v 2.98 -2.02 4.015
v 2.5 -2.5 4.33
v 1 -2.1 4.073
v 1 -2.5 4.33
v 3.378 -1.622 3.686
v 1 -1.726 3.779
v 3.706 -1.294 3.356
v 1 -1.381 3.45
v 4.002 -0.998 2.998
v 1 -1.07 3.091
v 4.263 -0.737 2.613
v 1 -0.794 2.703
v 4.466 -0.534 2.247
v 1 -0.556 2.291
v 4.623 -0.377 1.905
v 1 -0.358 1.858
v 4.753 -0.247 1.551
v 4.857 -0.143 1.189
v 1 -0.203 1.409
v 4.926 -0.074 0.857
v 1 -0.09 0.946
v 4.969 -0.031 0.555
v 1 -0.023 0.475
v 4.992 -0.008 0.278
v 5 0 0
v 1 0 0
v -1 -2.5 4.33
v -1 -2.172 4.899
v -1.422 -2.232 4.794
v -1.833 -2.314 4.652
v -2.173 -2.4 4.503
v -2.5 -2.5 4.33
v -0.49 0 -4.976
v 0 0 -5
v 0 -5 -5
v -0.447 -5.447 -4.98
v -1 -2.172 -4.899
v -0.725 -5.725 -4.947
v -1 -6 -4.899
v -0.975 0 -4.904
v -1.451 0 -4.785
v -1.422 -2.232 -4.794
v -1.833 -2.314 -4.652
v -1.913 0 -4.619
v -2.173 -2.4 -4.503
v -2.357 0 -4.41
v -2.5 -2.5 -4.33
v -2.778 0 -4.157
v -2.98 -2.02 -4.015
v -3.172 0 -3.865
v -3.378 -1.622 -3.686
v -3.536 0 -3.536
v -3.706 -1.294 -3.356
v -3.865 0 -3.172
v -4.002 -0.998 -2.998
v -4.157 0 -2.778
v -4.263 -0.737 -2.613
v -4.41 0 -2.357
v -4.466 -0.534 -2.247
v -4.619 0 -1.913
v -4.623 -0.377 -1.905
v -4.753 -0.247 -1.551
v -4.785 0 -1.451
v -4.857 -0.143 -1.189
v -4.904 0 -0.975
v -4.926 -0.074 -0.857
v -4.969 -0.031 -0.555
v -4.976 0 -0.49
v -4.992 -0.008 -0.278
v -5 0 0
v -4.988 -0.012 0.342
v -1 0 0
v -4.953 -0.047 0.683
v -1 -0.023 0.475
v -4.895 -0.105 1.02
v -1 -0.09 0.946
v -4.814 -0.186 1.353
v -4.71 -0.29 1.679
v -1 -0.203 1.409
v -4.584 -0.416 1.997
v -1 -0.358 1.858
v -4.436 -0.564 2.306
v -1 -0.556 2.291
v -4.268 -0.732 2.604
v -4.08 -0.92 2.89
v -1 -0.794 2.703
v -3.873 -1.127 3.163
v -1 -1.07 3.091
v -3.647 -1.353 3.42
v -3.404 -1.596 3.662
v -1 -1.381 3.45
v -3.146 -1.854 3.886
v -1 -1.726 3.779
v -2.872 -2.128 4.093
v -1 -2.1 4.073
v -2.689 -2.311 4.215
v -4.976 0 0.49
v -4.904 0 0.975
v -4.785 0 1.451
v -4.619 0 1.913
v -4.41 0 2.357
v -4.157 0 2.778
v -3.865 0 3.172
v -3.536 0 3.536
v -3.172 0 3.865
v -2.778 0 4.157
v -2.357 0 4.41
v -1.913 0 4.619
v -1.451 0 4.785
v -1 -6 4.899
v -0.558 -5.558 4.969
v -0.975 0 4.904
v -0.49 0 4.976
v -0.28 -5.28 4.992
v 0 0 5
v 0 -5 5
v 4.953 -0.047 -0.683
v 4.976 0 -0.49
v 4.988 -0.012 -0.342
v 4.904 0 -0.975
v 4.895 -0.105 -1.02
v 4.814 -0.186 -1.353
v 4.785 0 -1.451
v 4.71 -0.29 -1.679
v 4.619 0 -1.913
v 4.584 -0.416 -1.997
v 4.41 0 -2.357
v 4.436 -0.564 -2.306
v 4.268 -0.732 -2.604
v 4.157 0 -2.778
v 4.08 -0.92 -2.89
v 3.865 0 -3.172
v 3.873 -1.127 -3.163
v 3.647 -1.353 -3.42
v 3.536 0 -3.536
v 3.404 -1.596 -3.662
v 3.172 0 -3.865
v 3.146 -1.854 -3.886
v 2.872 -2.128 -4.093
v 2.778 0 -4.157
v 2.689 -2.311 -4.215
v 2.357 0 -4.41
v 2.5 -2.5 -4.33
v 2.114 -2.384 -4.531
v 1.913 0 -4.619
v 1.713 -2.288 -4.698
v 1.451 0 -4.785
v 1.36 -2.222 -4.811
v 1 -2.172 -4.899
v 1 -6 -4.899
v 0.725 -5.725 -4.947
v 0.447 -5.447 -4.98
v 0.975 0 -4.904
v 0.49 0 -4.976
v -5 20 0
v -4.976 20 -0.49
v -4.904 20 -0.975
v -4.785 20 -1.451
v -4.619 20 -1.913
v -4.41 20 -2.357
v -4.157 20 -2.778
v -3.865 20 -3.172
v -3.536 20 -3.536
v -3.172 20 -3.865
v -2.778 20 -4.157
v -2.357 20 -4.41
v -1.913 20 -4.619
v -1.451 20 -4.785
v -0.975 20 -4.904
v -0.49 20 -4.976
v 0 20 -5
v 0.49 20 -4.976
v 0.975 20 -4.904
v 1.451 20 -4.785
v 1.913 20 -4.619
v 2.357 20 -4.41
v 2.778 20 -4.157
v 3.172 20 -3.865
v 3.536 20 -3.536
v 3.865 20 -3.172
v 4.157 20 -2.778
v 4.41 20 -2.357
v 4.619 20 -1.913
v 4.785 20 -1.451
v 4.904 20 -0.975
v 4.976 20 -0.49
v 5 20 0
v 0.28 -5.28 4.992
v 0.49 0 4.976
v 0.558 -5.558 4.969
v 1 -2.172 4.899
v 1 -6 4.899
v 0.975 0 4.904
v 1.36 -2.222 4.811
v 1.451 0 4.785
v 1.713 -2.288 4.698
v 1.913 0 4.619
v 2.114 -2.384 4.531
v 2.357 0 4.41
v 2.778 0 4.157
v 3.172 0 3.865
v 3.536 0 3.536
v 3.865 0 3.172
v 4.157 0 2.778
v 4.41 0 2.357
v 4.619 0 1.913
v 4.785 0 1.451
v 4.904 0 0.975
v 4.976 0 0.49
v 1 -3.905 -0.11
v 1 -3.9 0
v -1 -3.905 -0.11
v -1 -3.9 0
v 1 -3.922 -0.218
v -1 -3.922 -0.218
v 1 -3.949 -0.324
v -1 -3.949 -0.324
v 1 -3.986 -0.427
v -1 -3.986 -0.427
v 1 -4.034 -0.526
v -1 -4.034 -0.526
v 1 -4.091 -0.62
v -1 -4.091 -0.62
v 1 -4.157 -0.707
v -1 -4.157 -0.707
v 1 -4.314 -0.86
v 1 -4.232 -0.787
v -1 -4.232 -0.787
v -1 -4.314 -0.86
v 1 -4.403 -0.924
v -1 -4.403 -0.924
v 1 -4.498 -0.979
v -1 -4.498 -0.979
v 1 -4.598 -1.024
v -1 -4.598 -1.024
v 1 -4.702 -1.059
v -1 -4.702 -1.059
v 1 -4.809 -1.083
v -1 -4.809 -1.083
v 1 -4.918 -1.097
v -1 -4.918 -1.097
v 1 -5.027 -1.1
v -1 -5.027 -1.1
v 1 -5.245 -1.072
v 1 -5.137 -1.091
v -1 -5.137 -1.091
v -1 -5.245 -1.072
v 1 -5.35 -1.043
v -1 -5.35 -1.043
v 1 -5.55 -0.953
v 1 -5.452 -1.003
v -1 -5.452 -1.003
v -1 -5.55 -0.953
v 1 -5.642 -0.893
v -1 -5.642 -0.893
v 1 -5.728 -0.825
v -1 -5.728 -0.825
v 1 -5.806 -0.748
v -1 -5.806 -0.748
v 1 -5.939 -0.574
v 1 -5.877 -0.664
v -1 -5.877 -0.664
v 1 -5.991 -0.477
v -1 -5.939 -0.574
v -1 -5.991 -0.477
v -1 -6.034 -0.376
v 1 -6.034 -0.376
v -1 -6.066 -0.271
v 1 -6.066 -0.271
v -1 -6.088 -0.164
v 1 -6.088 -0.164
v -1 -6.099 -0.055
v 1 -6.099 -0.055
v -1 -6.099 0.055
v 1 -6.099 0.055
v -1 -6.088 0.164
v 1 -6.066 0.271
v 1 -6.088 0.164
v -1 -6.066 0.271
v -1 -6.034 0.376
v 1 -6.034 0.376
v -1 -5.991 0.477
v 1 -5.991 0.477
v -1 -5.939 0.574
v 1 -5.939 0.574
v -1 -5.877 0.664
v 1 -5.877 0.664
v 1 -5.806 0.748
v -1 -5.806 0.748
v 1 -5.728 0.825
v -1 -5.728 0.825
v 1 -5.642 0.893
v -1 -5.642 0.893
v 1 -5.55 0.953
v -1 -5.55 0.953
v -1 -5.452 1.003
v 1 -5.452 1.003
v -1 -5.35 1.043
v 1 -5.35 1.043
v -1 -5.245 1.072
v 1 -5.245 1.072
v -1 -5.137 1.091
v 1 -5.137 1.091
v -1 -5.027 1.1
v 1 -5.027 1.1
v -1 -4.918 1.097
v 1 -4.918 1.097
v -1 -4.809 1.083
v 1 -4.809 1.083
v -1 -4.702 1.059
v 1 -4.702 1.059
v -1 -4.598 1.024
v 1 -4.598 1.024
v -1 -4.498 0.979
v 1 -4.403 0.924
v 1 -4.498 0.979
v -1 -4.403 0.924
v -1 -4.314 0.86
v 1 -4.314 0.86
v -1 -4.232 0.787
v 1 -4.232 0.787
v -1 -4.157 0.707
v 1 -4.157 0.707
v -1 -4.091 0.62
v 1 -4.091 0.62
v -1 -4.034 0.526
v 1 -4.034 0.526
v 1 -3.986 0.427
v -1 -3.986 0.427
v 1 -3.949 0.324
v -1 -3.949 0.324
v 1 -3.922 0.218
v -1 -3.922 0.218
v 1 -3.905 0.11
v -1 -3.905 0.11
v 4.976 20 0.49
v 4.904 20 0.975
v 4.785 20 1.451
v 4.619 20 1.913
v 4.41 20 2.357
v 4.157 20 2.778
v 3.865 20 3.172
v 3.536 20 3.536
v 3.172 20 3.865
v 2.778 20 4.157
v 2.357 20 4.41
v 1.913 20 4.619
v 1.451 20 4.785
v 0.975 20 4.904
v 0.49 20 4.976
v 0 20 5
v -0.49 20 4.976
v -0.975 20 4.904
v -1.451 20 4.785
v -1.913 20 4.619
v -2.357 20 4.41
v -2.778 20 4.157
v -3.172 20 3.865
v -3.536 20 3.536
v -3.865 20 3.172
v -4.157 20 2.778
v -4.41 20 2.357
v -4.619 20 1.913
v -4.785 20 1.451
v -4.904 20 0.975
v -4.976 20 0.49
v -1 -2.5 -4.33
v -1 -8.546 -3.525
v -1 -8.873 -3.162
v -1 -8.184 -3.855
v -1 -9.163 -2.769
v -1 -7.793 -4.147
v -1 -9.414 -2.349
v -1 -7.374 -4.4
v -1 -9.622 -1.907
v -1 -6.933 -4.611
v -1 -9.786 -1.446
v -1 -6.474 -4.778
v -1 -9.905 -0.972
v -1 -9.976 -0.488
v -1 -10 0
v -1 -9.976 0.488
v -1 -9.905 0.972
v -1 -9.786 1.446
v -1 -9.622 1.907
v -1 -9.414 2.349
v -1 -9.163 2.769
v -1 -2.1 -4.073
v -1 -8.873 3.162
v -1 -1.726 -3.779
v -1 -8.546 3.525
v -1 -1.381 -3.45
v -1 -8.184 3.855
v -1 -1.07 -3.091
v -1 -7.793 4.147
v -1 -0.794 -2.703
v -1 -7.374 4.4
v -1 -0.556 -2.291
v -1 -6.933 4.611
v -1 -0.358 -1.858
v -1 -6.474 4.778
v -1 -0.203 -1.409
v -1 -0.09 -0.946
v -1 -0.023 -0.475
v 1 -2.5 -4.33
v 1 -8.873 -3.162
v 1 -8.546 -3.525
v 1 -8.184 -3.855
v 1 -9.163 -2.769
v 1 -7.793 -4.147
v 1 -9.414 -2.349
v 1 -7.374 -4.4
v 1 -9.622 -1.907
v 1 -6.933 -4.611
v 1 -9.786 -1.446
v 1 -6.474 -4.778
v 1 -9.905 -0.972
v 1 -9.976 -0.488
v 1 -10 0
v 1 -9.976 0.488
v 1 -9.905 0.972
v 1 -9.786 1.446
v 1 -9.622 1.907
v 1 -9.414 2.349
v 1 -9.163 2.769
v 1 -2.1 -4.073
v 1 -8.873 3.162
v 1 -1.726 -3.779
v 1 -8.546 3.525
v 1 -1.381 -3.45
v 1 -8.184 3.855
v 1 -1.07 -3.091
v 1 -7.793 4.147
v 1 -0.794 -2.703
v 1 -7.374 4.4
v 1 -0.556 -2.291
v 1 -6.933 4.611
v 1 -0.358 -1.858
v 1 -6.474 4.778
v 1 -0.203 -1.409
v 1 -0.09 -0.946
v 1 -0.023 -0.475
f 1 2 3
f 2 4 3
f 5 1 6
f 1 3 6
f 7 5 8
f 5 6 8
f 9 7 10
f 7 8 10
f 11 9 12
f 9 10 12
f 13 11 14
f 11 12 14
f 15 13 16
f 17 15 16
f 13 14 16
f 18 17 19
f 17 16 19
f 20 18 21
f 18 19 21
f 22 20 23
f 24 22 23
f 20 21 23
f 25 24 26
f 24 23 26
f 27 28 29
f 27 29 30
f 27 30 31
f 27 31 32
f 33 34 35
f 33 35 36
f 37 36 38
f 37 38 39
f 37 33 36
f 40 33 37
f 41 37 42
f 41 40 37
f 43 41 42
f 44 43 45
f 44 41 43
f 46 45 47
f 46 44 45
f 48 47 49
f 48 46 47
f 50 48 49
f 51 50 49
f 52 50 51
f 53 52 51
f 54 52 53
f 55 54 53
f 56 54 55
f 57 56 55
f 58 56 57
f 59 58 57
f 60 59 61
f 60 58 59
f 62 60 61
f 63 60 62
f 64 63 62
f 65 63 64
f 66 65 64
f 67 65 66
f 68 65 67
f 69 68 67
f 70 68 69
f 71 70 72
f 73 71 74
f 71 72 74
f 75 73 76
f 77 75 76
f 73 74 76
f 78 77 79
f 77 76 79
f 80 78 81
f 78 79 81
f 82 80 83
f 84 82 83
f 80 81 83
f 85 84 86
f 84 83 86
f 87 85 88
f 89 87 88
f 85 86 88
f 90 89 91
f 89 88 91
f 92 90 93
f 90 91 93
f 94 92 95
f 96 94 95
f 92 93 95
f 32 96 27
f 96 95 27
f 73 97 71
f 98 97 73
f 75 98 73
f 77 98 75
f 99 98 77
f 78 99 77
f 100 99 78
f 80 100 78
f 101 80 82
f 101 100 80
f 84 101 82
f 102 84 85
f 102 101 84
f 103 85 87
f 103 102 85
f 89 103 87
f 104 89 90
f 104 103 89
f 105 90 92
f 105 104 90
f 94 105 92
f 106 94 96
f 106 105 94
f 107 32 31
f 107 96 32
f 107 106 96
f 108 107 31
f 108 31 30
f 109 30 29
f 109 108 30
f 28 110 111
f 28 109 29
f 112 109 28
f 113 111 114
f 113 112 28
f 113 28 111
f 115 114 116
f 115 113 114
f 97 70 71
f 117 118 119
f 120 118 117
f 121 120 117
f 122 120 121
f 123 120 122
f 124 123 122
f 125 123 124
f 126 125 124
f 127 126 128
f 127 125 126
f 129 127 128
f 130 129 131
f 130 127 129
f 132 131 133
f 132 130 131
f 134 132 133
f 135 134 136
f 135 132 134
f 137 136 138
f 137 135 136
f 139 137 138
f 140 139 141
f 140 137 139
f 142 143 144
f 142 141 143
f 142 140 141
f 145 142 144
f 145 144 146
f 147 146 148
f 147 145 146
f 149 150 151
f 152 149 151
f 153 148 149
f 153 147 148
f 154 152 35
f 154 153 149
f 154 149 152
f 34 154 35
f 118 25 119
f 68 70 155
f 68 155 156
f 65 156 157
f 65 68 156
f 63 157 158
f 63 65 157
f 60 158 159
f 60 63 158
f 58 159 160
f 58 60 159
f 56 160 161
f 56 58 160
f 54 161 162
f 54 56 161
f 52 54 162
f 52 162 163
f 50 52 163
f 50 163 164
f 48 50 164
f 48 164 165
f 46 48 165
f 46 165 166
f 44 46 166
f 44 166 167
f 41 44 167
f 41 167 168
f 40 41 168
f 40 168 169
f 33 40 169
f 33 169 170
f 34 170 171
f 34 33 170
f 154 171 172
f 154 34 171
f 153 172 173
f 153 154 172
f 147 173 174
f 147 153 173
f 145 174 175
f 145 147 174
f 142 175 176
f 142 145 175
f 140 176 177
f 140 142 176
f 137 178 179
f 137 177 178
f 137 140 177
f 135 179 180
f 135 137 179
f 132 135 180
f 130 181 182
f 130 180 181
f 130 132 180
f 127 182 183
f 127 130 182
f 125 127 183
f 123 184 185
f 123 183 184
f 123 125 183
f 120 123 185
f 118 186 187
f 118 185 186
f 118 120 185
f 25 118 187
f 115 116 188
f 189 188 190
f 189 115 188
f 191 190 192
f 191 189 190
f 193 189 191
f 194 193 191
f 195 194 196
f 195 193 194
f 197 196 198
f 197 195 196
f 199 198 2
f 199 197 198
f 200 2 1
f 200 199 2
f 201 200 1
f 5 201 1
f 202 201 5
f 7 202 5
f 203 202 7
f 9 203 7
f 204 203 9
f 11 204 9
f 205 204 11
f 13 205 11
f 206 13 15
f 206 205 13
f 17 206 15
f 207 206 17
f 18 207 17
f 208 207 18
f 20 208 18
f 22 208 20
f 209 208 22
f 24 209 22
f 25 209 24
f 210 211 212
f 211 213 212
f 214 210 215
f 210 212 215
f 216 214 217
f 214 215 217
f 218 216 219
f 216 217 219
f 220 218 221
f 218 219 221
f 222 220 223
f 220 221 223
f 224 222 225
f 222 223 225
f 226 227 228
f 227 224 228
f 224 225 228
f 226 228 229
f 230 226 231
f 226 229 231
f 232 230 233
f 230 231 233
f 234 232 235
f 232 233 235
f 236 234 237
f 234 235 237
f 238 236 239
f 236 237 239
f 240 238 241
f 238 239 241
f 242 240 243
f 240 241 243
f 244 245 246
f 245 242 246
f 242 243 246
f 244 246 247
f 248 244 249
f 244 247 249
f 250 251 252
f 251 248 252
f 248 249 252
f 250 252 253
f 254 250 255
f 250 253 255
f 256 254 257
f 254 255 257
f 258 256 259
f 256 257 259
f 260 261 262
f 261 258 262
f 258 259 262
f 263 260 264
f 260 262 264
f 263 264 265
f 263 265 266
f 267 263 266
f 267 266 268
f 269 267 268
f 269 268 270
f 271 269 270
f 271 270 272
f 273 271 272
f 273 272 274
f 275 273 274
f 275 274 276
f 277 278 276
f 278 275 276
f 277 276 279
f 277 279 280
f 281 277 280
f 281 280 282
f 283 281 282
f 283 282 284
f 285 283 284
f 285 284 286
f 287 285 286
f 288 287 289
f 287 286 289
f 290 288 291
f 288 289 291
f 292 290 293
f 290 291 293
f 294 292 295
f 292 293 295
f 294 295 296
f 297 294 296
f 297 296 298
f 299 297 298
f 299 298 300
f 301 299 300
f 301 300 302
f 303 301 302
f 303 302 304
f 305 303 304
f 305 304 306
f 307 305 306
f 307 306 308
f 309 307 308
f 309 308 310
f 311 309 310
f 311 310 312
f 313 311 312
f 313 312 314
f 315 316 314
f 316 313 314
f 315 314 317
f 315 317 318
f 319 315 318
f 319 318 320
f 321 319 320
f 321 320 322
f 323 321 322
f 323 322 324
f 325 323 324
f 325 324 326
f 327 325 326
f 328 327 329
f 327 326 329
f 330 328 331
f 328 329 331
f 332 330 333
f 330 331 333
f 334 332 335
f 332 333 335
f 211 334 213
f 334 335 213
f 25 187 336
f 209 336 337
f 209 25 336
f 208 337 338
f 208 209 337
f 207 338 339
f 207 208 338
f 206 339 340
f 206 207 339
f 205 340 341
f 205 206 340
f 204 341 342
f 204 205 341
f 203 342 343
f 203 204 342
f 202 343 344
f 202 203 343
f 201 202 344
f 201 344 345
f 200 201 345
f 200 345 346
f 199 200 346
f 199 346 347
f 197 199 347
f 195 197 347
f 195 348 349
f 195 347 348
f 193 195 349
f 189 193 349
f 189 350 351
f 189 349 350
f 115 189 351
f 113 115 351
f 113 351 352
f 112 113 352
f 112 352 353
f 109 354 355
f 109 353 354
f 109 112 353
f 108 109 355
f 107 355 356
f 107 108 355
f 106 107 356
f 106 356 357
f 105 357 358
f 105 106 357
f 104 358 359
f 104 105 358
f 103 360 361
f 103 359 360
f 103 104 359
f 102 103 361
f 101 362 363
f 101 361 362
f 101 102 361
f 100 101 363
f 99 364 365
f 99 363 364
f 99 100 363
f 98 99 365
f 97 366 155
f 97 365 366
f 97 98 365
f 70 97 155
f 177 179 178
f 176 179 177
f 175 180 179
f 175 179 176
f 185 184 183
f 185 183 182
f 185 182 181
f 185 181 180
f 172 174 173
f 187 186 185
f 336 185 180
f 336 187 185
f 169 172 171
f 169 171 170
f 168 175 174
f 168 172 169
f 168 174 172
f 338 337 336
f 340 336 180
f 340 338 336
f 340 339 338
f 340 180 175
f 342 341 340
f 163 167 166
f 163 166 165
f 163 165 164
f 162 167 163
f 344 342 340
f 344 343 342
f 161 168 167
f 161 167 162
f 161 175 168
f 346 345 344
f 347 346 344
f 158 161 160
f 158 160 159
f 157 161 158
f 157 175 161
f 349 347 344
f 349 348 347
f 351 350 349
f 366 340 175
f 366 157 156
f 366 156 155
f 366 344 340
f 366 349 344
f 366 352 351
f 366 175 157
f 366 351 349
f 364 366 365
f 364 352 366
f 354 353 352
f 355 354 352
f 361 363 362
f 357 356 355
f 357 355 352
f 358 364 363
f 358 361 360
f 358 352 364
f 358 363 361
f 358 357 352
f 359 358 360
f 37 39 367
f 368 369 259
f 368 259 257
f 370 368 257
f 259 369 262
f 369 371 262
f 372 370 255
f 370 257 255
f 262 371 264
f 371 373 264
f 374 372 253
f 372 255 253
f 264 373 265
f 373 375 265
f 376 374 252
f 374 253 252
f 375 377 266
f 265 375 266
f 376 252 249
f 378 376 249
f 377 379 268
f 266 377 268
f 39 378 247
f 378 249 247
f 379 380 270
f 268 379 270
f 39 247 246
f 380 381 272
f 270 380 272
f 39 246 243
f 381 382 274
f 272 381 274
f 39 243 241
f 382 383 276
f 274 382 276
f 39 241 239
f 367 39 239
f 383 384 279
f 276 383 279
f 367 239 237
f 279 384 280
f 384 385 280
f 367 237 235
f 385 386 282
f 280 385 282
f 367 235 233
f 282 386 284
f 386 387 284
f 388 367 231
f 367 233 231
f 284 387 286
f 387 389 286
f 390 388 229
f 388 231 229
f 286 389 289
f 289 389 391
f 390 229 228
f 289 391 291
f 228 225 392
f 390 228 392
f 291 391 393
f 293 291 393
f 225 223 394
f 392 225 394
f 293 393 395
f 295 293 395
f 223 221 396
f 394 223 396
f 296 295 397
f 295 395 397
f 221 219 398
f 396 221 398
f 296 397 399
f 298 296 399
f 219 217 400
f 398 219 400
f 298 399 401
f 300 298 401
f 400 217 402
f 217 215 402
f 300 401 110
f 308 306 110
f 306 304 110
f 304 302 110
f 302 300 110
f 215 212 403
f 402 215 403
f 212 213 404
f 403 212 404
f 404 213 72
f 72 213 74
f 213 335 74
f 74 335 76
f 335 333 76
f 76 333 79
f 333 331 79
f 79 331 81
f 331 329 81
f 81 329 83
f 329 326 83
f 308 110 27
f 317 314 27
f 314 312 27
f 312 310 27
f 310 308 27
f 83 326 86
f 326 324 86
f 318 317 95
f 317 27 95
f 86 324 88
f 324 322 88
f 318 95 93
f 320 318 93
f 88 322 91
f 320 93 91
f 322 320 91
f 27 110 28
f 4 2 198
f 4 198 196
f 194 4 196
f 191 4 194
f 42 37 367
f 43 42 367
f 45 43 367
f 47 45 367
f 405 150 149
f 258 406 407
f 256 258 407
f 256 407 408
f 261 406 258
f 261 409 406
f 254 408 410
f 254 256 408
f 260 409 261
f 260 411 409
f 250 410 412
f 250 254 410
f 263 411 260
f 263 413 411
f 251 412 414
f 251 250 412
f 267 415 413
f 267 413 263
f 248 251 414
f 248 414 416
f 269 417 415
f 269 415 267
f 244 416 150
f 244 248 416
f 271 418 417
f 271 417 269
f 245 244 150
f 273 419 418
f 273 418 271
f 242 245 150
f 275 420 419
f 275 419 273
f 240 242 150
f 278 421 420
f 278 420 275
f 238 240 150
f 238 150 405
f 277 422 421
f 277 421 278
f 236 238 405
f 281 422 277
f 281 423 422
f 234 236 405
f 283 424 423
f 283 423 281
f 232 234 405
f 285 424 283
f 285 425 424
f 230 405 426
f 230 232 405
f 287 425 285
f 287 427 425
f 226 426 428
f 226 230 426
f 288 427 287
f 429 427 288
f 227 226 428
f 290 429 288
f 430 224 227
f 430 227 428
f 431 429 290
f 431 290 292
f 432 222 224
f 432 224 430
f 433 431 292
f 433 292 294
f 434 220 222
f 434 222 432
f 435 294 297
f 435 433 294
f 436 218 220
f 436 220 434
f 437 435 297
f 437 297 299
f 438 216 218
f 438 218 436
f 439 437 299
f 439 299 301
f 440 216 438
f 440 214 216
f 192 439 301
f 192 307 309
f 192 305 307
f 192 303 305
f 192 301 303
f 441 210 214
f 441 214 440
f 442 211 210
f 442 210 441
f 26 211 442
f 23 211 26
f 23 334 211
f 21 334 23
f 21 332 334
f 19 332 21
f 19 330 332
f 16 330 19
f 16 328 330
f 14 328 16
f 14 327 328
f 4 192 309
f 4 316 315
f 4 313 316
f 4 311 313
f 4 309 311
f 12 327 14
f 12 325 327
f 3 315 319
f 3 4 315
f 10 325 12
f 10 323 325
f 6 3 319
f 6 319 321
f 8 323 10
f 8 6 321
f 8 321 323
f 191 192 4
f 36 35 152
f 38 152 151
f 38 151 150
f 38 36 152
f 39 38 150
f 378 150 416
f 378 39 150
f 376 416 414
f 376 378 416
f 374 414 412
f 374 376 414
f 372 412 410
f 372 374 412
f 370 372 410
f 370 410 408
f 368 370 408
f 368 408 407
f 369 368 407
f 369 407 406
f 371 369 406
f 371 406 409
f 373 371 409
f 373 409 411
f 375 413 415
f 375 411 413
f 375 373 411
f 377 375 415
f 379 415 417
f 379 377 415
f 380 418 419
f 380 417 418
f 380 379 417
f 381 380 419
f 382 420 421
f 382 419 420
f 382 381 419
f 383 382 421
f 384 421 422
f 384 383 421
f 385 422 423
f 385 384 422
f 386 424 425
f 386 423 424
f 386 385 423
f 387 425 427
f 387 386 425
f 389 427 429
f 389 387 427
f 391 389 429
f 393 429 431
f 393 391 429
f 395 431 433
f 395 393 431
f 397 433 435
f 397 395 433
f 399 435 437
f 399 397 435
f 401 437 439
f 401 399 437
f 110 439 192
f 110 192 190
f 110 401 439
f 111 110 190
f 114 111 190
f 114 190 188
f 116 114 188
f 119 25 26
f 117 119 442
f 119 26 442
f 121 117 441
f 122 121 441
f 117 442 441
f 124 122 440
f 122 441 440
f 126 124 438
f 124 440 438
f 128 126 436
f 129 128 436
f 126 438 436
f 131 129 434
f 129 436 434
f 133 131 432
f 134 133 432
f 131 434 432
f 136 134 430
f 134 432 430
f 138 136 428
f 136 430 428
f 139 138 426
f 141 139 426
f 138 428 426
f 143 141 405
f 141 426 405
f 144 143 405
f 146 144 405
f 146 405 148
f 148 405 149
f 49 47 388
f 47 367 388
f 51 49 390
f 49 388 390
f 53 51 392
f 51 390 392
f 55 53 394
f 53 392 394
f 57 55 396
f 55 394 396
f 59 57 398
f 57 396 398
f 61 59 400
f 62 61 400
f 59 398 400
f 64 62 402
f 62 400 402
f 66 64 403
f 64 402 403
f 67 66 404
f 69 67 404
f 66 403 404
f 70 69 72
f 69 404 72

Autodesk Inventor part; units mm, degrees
ref_plane "YZ Plane" through (0, 0, 0) normal (1, 0, 0) x (0, 1, 0)
ref_plane "XZ Plane" through (0, 0, 0) normal (0, 1, 0) x (-1, 0, 0)
ref_plane "XY Plane" through (0, 0, 0) normal (0, 0, 1) x (1, 0, 0)
sketch "Sketch1" plane through (0, 0, 0) normal (0, 1, 0) x (-1, 0, 0)
  circle A0 centre (0, 0) radius 5
  dimension "d0" = 10
extrude "Extrusion1" add sketch "Sketch1" along normal blind 20
sketch "Sketch2" plane through (0, 0, 0) normal (1, 0, 0) x (0, 1, 0)
  circle A0 centre (-5, 0) radius 1.1
  line L0 (0, -5) -> (0, 5) projected
  circle A1 centre (-5, 0) radius 5
  line L1 (0, 5) -> (-5, 5)
  line L2 (-5, -5) -> (0, -5)
  line L3 (0, -5) -> (0, 5)
  point P0 (0, 0)
  dimension "d3" = 2.2
  dimension "d4" = 5
  dimension "d5" = 5
  dimension "d6" = 10
extrude "Extrusion2" add sketch "Sketch2" along normal mid plane 2
sketch "Sketch3" plane through (1, 0, 0) normal (1, 0, 0) x (0, 0, -1)
  circle A0 centre (0, -5) radius 1.1 projected
  line L0 (0, -5) -> (4.3301, -2.5)
  line L1 (0, -5) -> (5, -5) construction
  line L2 (0, -5) -> (-4.3301, -2.5)
  line L3 (0, -5) -> (5, -5) construction
  circle A1 centre (0, -5) radius 1.1
  circle A2 centre (0, -5) radius 5
  line L4 (0, -5) -> (5, -2.1132)
  line L5 (0, -5) -> (-5, -2.1132)
  line L6 (-5, 0) -> (-5, -5) projected
  line L7 (-5, 0) -> (-5, -2.1132)
  line L8 (5, -2.1132) -> (5, 0)
  line L9 (5, 0) -> (-5, 0)
  line L10 (4.899, 0) -> (-4.899, 0) projected
  point P0 (0, 0)
  point P1 (0, 0)
  dimension "d9" = 5
  dimension "d10" = 30
  dimension "d11" = 5
  dimension "d12" = 150
  dimension "d13" = 2.1132
extrude "Extrusion3" add sketch "Sketch3" along normal blind 5 contours A2 L9 L8 L4 | L5 L6 L9 A2
mirror "Mirror1" about plane through (0, 0, 0) normal (1, 0, 0) of "Extrusion3"
sketch "Sketch4" plane through (0, 20, 0) normal (0, 1, 0) x (1, 0, 0)
  circle A0 centre (0, 0) radius 5
  circle A1 centre (0, 0) radius 10
  dimension "d16" = 10
  dimension "d17" = 20
extrude "Extrusion4" cut sketch "Sketch4" against normal through all
properties part number "Camera encase" material "Rubber"
